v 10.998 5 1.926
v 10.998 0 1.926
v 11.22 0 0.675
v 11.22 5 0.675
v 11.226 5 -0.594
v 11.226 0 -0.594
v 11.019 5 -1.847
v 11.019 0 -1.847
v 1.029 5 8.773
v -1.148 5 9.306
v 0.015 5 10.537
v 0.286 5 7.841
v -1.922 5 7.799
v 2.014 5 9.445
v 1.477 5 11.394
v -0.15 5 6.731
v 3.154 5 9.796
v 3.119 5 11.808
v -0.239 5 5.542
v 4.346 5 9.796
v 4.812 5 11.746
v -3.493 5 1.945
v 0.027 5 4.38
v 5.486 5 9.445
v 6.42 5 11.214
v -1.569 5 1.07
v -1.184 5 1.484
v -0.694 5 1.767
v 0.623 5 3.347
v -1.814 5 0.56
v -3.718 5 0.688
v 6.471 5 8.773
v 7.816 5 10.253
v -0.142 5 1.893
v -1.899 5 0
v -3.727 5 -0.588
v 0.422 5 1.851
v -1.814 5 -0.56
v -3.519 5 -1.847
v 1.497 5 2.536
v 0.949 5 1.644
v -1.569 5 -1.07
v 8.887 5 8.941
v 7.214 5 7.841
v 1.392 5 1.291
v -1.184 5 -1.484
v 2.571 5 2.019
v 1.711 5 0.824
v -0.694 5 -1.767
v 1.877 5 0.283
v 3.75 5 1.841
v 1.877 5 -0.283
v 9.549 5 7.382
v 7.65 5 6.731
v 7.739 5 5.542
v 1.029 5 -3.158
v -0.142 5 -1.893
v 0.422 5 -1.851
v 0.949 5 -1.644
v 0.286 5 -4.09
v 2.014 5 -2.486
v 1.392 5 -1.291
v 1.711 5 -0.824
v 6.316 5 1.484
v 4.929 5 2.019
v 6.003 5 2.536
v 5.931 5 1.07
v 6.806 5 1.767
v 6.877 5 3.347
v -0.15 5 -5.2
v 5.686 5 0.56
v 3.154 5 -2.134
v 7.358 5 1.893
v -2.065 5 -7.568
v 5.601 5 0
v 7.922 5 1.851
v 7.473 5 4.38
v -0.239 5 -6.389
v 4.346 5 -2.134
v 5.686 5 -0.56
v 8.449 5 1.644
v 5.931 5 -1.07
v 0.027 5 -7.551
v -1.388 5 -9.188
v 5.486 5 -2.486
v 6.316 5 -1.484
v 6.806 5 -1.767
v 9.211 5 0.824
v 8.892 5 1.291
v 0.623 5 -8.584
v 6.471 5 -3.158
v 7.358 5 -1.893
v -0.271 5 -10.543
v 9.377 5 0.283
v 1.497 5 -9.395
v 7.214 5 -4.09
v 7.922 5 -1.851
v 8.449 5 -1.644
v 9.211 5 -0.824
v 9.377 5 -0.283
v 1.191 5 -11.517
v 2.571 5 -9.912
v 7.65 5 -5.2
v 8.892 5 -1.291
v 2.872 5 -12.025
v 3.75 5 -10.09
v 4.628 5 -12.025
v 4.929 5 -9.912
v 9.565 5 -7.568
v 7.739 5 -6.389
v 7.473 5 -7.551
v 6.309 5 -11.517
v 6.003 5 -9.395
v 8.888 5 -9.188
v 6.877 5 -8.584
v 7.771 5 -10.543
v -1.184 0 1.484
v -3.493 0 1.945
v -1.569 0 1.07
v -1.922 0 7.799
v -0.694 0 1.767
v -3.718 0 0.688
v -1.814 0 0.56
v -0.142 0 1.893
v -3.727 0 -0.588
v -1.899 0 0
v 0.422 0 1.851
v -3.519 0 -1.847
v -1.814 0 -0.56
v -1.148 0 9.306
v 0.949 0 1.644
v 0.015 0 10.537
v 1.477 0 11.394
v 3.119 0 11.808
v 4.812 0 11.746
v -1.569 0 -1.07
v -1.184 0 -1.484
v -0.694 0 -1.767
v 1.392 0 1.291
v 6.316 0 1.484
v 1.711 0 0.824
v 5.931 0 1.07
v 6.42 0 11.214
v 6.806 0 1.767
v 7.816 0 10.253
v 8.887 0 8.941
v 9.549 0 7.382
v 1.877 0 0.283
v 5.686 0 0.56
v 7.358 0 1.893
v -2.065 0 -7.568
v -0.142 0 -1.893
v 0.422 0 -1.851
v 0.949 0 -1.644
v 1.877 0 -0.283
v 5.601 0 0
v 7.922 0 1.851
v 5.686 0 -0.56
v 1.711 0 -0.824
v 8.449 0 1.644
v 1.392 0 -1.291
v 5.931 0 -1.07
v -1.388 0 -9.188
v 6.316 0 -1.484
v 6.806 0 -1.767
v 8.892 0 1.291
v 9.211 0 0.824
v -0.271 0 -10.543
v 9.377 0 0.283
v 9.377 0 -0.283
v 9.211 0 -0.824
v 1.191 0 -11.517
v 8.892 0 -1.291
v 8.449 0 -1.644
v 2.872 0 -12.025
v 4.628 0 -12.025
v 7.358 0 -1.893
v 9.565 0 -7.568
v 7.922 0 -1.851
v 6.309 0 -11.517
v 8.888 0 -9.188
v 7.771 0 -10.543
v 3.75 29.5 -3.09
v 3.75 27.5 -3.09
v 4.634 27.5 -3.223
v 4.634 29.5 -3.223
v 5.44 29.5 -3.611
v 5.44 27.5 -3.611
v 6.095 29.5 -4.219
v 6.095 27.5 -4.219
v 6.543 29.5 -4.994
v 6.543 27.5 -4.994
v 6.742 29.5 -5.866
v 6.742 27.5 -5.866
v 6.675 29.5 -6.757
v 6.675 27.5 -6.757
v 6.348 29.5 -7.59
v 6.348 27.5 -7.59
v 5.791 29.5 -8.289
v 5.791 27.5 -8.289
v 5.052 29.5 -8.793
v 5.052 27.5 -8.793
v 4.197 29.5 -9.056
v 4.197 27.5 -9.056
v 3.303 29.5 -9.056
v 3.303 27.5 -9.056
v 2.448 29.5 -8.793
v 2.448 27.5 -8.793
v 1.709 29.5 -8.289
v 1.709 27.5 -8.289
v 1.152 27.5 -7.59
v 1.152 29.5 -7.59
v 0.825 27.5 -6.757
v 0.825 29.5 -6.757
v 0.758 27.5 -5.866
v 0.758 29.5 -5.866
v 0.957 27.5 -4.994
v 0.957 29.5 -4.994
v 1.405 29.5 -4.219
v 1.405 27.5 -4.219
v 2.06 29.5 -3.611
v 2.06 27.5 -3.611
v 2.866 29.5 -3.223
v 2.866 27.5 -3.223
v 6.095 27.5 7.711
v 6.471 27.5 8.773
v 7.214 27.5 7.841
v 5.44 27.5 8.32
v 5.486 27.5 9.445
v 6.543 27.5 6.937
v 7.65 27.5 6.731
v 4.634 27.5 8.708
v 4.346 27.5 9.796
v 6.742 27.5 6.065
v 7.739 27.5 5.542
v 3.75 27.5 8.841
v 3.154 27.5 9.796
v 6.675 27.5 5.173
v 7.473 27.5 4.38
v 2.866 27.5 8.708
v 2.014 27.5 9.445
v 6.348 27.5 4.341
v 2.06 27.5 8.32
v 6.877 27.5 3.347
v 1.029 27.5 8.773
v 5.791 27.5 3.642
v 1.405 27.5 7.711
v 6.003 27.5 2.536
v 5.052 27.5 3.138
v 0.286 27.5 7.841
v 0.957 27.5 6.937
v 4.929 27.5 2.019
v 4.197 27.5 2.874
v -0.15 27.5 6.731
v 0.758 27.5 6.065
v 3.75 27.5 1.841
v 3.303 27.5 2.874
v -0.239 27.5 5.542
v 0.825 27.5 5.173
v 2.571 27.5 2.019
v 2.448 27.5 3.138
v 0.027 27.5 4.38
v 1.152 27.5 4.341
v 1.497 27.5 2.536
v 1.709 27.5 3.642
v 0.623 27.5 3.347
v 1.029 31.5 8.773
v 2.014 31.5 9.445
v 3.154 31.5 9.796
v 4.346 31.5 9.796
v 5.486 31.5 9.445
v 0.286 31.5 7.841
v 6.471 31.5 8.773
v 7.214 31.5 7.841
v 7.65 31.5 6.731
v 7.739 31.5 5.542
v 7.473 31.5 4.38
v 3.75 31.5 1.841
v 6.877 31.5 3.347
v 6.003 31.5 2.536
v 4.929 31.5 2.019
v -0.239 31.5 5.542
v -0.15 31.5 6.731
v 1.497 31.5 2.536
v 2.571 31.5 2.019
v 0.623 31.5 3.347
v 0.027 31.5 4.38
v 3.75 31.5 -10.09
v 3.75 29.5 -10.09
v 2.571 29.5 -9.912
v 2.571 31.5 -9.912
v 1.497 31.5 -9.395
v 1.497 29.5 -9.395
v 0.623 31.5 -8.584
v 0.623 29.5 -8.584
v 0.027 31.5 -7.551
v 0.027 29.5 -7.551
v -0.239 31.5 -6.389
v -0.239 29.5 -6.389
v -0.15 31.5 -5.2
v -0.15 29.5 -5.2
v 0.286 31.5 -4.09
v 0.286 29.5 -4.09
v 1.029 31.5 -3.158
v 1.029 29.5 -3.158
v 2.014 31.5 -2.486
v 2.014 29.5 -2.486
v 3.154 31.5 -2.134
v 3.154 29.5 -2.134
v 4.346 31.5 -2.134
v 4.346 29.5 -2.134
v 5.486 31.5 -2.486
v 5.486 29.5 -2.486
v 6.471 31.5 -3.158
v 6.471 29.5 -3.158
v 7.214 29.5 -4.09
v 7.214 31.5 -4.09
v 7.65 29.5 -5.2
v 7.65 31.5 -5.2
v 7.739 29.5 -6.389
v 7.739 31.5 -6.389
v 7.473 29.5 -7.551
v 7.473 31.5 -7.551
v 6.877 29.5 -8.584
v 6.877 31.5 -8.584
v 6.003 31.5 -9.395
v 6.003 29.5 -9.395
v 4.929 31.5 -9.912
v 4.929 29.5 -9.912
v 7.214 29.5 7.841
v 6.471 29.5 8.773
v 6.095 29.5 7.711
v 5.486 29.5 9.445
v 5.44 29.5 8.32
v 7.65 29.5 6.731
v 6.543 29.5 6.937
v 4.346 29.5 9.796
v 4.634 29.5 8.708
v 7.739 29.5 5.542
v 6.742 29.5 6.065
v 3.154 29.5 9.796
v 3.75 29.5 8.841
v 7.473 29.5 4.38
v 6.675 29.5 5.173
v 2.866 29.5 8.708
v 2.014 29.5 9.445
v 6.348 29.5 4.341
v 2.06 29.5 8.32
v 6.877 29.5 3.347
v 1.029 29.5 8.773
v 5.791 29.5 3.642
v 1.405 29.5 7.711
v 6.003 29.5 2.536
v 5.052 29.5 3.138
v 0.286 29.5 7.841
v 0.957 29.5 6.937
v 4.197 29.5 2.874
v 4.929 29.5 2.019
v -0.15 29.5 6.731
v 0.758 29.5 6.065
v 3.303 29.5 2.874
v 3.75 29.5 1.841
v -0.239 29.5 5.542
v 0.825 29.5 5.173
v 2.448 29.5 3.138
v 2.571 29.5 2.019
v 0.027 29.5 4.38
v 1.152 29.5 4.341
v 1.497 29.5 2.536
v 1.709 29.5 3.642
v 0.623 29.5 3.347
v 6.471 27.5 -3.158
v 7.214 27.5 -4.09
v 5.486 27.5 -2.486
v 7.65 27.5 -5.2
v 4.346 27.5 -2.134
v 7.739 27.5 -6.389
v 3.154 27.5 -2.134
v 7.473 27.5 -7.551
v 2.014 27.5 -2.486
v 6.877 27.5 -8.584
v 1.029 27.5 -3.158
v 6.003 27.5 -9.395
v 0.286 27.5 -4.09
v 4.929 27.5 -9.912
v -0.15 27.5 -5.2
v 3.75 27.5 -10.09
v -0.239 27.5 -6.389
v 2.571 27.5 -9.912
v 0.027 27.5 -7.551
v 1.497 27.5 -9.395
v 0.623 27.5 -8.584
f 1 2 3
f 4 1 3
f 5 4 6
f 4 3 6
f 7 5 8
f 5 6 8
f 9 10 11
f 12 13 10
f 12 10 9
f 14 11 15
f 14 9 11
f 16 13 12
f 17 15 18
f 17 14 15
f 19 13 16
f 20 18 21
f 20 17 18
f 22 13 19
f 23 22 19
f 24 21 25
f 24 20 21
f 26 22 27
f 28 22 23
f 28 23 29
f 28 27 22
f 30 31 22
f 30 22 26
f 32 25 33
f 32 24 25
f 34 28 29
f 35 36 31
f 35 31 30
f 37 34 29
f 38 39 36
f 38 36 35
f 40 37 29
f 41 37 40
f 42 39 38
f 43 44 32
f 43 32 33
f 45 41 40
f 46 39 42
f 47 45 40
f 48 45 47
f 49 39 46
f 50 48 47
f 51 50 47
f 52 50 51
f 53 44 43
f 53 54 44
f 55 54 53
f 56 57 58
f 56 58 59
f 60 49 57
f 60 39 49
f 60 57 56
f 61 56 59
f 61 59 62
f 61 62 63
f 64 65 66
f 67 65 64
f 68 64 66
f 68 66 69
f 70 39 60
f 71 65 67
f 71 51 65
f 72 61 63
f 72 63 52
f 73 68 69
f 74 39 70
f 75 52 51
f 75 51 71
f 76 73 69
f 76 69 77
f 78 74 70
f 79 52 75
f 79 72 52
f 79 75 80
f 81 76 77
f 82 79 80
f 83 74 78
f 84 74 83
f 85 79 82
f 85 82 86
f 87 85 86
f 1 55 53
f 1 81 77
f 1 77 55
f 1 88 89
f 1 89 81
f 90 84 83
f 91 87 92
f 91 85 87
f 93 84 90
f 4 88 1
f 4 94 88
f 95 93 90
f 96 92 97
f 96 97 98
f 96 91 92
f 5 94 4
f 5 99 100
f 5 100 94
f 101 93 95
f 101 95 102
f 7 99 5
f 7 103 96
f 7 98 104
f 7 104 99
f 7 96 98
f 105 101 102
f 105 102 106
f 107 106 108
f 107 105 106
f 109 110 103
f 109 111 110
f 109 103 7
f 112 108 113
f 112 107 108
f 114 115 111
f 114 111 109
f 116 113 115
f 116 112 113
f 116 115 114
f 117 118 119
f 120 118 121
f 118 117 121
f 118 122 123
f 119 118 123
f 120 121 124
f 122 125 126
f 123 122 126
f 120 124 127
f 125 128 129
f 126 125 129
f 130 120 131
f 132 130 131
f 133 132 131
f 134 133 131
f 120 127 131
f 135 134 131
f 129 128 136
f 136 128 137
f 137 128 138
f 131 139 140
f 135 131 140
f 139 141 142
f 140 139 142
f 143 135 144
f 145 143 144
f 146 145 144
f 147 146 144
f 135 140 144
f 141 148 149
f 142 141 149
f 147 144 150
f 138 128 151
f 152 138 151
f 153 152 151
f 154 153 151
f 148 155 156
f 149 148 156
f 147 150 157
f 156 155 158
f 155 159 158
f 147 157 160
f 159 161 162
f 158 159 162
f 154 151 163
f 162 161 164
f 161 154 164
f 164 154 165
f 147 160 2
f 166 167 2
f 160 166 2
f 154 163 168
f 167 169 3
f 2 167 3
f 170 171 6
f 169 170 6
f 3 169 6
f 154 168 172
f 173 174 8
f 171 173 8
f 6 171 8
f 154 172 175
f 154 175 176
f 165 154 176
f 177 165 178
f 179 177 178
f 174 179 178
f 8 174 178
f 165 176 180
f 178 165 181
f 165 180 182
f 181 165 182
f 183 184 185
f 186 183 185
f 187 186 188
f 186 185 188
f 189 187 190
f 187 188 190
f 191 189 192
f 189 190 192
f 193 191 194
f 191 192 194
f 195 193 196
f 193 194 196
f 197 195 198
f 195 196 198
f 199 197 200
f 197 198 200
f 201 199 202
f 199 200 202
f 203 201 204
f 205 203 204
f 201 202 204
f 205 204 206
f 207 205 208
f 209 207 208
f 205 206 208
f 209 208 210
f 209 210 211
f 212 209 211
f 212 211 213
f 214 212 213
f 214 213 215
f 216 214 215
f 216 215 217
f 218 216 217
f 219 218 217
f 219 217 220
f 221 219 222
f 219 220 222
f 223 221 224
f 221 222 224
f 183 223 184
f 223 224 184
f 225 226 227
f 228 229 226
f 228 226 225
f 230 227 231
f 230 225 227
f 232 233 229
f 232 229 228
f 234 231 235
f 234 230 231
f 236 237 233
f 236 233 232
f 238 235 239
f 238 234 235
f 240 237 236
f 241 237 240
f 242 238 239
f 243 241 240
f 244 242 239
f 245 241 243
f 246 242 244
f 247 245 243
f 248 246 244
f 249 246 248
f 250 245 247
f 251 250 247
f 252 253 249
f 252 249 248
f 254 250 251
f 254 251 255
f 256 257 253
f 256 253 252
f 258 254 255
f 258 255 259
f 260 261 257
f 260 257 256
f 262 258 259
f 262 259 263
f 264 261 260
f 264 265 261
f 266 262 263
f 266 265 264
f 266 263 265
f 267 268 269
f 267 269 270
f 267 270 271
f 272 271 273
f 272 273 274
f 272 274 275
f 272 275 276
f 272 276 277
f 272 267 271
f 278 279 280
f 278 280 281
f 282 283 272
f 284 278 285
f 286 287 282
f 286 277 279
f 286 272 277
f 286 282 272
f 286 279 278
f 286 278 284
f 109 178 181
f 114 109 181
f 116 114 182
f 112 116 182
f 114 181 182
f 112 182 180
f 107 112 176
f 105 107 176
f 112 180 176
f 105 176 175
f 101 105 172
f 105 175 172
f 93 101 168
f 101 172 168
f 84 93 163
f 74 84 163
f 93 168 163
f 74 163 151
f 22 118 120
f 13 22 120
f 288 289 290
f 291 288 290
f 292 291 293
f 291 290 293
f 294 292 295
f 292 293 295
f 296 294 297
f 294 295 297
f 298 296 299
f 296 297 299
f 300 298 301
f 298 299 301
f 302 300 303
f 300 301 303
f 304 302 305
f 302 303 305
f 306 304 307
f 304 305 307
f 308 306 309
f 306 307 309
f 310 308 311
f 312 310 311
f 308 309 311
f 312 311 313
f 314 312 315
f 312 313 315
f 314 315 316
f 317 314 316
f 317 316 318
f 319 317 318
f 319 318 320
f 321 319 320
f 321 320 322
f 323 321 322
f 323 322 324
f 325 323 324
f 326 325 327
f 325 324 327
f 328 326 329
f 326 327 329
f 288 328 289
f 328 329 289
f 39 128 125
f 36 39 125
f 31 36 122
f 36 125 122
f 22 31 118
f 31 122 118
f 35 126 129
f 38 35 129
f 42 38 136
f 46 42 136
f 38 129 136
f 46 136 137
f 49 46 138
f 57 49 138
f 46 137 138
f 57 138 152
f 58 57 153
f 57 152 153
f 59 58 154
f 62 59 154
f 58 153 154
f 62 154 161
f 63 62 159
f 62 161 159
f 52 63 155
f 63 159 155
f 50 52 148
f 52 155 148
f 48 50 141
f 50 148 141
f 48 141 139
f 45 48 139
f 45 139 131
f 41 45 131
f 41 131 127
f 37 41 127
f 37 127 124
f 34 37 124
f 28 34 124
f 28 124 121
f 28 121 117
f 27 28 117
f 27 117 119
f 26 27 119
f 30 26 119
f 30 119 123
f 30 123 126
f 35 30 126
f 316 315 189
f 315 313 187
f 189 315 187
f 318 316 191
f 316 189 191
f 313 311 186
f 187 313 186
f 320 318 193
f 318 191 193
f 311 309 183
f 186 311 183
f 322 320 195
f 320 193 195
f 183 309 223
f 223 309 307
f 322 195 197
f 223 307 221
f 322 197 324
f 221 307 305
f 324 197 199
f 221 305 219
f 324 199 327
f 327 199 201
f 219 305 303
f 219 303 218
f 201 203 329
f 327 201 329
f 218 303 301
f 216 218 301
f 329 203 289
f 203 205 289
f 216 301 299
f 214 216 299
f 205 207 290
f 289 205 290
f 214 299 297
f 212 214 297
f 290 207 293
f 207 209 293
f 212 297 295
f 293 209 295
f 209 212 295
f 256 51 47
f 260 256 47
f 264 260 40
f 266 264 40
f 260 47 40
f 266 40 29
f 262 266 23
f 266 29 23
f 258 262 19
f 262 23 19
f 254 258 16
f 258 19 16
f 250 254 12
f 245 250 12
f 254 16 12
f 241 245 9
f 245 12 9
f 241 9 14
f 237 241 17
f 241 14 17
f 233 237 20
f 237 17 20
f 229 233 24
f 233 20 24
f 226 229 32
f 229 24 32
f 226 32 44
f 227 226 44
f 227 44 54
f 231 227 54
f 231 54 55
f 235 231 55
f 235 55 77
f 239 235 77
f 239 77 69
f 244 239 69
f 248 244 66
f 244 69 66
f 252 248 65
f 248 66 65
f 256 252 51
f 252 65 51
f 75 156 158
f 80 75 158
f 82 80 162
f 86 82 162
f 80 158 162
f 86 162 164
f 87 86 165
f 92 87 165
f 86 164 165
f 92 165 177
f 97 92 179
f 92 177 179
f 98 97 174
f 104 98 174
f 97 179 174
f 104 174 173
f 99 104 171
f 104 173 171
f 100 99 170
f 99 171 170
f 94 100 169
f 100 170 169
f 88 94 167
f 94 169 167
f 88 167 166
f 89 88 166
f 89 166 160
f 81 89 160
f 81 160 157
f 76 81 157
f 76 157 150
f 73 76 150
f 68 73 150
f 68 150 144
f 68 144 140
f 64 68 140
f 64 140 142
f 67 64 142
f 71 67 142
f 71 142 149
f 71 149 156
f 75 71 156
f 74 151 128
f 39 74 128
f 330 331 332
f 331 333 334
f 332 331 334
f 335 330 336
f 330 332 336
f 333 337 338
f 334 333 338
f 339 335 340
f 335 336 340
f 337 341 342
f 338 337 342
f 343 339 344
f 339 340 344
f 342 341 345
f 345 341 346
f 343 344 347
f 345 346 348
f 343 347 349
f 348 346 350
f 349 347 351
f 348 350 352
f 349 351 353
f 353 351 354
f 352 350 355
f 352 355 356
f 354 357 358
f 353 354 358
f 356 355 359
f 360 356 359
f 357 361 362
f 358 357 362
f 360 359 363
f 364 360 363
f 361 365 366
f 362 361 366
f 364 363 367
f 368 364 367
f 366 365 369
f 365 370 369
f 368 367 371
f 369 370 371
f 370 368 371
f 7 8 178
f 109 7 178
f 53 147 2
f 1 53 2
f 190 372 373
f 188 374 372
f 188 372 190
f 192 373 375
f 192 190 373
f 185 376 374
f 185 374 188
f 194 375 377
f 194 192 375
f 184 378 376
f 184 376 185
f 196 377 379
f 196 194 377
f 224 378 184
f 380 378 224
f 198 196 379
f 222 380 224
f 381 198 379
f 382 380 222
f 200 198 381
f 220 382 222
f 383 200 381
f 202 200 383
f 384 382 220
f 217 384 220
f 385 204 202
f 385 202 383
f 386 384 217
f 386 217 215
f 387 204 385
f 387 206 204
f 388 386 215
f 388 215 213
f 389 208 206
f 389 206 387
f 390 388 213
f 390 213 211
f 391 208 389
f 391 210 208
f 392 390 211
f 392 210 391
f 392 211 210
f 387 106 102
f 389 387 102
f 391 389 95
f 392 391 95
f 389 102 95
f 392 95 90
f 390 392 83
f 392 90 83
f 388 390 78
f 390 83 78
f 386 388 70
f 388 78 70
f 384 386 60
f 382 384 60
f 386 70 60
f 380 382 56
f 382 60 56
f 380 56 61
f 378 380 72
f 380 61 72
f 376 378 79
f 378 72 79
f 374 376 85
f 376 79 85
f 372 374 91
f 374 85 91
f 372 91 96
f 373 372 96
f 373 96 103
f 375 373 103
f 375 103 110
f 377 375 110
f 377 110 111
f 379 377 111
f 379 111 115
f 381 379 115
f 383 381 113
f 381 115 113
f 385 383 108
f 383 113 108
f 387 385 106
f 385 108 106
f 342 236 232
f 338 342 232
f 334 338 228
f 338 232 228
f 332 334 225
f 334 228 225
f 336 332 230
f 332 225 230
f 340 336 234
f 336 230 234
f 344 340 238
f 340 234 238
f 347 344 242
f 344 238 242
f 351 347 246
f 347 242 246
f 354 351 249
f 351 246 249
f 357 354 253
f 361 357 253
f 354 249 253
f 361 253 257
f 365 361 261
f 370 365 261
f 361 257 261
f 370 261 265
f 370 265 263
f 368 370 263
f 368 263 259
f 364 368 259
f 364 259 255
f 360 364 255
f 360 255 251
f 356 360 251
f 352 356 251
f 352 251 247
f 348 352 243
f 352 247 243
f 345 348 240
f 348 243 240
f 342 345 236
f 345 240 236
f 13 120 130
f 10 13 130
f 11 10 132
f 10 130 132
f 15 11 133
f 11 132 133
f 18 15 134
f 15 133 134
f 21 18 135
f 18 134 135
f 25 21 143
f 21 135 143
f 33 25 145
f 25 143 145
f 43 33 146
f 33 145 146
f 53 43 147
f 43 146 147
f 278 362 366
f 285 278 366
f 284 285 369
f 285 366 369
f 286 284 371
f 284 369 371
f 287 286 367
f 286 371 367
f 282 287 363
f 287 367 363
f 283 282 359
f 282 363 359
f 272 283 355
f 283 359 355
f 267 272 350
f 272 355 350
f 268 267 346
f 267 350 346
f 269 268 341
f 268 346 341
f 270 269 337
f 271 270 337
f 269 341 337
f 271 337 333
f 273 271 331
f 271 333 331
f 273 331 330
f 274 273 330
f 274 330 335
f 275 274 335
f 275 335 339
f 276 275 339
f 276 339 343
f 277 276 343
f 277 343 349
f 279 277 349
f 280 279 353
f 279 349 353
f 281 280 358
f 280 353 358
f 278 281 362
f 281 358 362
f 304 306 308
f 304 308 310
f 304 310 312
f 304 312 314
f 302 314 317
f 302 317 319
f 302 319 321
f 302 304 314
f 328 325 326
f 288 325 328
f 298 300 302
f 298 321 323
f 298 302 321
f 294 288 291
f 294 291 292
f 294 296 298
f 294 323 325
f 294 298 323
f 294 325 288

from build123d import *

# Parameters (mm, degrees)
BOSS_EXTRUDE2_DEPTH   = 5
SKETCH3_R             = 4
BOSS_EXTRUDE3_DEPTH   = 22.5
SKETCH4_R             = 3
BOSS_EXTRUDE4_DEPTH   = 2
SKETCH5_R             = 4
BOSS_EXTRUDE5_DEPTH   = 2
F_6_CLEARANCE_HOLE1_D = 3.7973


with BuildPart() as part:
    # Sketch2 → Boss-Extrude2 (new body)
    with BuildSketch(Plane(origin=(0, 0, 0), x_dir=(1, 0, 0), z_dir=(0, 1, 0))):
        with BuildLine():
            ThreePointArc((-1.921673483, -7.798539123), (3.967844549, -11.837003018), (9.548776015, -7.381801872))
            Line((9.548776015, -7.381801872), (10.998470019, -1.926053578))
            ThreePointArc((10.998470019, -1.926053578), (11.24988985, -0.04064778), (11.018921171, 1.84737246))
            Line((11.018921171, 1.84737246), (9.565136937, 7.567628243))
            ThreePointArc((9.565136937, 7.567628243), (3.75, 12.089730275), (-2.065136937, 7.567628243))
            Line((-2.065136937, 7.567628243), (-3.518921171, 1.84737246))
            ThreePointArc((-3.518921171, 1.84737246), (-3.749830525, -0.050419155), (-3.493426606, -1.944934706))
            Line((-3.493426606, -1.944934706), (-1.921673483, -7.798539123))
        make_face()
    extrude(amount=BOSS_EXTRUDE2_DEPTH)

    # Sketch3 → Boss-Extrude3 (add)
    with BuildSketch(Plane(origin=(0, 5, 0), x_dir=(1, 0, 0), z_dir=(0, 1, 0))):
        with Locations(Location((3.75, -5.840959009, 0), (0, 0, 90))):
            Circle(SKETCH3_R)
        with Locations(Location((3.75, 6.089730275, 0), (0, 0, 90))):
            Circle(SKETCH3_R)
    extrude(amount=BOSS_EXTRUDE3_DEPTH)

    # Sketch4 → Boss-Extrude4 (add)
    with BuildSketch(Plane(origin=(0, 27.5, 0), x_dir=(1, 0, 0), z_dir=(0, 1, 0))):
        with Locations(Location((3.75, -5.840959009, 0), (0, 0, 270))):
            Circle(SKETCH4_R)
        with Locations(Location((3.75, 6.089730275, 0), (0, 0, 270))):
            Circle(SKETCH4_R)
    extrude(amount=BOSS_EXTRUDE4_DEPTH)

    # Sketch5 → Boss-Extrude5 (add)
    with BuildSketch(Plane(origin=(0, 29.5, 0), x_dir=(1, 0, 0), z_dir=(0, 1, 0))):
        with Locations(Location((3.75, -5.840959009, 0), (0, 0, 90))):
            Circle(SKETCH5_R)
        with Locations(Location((3.75, 6.089730275, 0), (0, 0, 90))):
            Circle(SKETCH5_R)
    extrude(amount=BOSS_EXTRUDE5_DEPTH)

    # #6 Clearance Hole1 (through all)
    with Locations(Plane(origin=(0, 5, 0), x_dir=(1, 0, 0), z_dir=(0, 1, 0))):
        with Locations((0, 0), (7.5, 0)):
            Hole(F_6_CLEARANCE_HOLE1_D / 2)


solid = part.part
